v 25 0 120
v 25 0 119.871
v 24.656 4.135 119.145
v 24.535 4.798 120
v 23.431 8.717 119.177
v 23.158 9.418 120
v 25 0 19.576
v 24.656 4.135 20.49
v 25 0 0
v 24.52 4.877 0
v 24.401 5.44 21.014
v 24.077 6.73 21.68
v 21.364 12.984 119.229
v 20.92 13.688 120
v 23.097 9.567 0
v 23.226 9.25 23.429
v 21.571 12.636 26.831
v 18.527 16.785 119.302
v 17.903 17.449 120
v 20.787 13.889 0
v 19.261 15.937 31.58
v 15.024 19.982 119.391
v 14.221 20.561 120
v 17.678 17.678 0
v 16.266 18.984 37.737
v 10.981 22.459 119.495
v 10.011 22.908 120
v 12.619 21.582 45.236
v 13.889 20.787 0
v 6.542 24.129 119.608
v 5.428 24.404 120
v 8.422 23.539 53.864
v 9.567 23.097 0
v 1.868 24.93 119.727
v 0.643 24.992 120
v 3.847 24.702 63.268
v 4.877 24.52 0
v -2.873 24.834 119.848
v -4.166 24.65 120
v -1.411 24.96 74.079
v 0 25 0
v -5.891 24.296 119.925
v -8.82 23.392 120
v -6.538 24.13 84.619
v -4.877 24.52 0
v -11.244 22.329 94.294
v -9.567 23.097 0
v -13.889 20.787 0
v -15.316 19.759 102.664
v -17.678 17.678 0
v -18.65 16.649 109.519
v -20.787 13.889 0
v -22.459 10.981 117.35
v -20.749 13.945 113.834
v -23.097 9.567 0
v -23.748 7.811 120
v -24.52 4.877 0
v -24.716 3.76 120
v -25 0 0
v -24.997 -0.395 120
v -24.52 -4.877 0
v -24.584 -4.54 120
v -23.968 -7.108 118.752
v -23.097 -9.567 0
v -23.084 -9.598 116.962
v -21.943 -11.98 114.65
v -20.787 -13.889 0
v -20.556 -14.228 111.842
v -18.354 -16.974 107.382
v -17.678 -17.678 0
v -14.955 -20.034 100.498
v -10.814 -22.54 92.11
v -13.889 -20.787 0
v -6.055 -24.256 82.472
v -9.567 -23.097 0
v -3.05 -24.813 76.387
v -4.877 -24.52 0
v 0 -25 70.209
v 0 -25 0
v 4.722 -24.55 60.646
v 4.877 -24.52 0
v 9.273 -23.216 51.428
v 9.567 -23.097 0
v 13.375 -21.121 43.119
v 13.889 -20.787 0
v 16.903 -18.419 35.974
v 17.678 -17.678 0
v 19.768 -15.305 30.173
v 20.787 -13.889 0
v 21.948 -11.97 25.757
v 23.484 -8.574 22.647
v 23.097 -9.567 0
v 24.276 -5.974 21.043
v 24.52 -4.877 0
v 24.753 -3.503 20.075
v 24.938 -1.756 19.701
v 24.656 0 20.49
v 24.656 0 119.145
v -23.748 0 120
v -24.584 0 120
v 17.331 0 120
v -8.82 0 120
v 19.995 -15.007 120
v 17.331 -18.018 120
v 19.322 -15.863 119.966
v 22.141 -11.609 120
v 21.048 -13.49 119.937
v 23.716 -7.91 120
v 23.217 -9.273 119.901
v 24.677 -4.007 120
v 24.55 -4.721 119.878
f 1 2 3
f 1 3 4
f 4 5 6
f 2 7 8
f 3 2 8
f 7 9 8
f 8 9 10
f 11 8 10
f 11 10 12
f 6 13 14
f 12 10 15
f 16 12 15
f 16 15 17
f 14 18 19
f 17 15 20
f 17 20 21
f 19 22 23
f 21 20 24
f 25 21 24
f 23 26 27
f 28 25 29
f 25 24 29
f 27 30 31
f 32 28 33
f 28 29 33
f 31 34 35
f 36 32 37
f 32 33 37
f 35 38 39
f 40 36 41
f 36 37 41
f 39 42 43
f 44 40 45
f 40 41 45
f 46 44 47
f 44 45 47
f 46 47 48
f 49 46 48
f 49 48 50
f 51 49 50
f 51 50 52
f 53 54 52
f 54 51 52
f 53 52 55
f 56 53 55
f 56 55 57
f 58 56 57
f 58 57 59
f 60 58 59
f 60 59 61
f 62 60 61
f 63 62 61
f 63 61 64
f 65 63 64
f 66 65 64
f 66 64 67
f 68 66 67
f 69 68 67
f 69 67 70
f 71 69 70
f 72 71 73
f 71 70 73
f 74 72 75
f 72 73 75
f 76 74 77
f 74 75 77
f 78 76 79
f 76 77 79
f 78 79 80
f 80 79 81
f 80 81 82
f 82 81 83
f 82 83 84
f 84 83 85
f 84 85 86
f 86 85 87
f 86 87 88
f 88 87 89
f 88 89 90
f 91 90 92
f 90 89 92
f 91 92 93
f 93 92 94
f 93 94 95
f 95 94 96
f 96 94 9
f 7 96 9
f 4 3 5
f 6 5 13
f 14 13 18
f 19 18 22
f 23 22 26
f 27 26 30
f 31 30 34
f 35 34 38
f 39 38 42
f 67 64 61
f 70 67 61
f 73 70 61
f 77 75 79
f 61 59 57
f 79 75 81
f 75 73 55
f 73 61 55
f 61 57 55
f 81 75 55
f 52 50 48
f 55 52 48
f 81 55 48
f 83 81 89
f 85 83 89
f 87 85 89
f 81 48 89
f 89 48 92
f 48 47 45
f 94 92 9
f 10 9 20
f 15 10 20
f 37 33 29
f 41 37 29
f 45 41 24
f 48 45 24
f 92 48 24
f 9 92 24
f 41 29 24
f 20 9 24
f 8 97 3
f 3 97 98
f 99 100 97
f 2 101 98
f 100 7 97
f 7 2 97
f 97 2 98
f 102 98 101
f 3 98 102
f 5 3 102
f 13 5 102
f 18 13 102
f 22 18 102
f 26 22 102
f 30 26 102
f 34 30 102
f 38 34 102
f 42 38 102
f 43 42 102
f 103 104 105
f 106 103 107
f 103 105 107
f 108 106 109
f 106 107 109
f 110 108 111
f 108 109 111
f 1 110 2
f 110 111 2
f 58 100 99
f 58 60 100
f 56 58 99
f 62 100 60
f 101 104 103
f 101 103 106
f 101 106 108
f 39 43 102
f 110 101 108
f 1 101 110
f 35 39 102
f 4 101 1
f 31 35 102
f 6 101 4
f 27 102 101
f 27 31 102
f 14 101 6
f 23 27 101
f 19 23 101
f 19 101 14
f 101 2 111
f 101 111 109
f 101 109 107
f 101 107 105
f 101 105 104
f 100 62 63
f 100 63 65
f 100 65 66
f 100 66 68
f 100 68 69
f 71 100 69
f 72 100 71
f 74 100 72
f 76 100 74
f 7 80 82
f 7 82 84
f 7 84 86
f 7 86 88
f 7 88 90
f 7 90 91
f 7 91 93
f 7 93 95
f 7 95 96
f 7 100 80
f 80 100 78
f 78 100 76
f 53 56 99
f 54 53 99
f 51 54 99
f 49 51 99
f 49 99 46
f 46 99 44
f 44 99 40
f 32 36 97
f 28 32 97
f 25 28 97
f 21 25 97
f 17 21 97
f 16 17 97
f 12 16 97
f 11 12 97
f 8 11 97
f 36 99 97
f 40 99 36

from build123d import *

# Parameters (mm, degrees)
F0_R     = 25
F1_DEPTH = 120
F3_DEPTH = 25
F5_DEPTH = 145


with BuildPart() as f1:
    # F0 (on Top) → F1 (new body)
    with BuildSketch(Plane.XY):
        Circle(F0_R)
    extrude(amount=F1_DEPTH)

    # F2 (on Front) → F3 (cut)
    with BuildSketch(Plane.XZ):
        Polygon((25.316058, 119.865231), (-24.936564, 120.713368), (25.316058, 18.935909), align=None)
    extrude(amount=F3_DEPTH, mode=Mode.SUBTRACT)

    # F4 (on Front) → F5 (cut)
    with BuildSketch(Plane.XZ):
        Polygon((24.655644, 119.145423), (-23.93619, 120.385893), (24.655644, 20.490063), align=None)
    extrude(amount=-F5_DEPTH, mode=Mode.SUBTRACT)


solid = f1.part
